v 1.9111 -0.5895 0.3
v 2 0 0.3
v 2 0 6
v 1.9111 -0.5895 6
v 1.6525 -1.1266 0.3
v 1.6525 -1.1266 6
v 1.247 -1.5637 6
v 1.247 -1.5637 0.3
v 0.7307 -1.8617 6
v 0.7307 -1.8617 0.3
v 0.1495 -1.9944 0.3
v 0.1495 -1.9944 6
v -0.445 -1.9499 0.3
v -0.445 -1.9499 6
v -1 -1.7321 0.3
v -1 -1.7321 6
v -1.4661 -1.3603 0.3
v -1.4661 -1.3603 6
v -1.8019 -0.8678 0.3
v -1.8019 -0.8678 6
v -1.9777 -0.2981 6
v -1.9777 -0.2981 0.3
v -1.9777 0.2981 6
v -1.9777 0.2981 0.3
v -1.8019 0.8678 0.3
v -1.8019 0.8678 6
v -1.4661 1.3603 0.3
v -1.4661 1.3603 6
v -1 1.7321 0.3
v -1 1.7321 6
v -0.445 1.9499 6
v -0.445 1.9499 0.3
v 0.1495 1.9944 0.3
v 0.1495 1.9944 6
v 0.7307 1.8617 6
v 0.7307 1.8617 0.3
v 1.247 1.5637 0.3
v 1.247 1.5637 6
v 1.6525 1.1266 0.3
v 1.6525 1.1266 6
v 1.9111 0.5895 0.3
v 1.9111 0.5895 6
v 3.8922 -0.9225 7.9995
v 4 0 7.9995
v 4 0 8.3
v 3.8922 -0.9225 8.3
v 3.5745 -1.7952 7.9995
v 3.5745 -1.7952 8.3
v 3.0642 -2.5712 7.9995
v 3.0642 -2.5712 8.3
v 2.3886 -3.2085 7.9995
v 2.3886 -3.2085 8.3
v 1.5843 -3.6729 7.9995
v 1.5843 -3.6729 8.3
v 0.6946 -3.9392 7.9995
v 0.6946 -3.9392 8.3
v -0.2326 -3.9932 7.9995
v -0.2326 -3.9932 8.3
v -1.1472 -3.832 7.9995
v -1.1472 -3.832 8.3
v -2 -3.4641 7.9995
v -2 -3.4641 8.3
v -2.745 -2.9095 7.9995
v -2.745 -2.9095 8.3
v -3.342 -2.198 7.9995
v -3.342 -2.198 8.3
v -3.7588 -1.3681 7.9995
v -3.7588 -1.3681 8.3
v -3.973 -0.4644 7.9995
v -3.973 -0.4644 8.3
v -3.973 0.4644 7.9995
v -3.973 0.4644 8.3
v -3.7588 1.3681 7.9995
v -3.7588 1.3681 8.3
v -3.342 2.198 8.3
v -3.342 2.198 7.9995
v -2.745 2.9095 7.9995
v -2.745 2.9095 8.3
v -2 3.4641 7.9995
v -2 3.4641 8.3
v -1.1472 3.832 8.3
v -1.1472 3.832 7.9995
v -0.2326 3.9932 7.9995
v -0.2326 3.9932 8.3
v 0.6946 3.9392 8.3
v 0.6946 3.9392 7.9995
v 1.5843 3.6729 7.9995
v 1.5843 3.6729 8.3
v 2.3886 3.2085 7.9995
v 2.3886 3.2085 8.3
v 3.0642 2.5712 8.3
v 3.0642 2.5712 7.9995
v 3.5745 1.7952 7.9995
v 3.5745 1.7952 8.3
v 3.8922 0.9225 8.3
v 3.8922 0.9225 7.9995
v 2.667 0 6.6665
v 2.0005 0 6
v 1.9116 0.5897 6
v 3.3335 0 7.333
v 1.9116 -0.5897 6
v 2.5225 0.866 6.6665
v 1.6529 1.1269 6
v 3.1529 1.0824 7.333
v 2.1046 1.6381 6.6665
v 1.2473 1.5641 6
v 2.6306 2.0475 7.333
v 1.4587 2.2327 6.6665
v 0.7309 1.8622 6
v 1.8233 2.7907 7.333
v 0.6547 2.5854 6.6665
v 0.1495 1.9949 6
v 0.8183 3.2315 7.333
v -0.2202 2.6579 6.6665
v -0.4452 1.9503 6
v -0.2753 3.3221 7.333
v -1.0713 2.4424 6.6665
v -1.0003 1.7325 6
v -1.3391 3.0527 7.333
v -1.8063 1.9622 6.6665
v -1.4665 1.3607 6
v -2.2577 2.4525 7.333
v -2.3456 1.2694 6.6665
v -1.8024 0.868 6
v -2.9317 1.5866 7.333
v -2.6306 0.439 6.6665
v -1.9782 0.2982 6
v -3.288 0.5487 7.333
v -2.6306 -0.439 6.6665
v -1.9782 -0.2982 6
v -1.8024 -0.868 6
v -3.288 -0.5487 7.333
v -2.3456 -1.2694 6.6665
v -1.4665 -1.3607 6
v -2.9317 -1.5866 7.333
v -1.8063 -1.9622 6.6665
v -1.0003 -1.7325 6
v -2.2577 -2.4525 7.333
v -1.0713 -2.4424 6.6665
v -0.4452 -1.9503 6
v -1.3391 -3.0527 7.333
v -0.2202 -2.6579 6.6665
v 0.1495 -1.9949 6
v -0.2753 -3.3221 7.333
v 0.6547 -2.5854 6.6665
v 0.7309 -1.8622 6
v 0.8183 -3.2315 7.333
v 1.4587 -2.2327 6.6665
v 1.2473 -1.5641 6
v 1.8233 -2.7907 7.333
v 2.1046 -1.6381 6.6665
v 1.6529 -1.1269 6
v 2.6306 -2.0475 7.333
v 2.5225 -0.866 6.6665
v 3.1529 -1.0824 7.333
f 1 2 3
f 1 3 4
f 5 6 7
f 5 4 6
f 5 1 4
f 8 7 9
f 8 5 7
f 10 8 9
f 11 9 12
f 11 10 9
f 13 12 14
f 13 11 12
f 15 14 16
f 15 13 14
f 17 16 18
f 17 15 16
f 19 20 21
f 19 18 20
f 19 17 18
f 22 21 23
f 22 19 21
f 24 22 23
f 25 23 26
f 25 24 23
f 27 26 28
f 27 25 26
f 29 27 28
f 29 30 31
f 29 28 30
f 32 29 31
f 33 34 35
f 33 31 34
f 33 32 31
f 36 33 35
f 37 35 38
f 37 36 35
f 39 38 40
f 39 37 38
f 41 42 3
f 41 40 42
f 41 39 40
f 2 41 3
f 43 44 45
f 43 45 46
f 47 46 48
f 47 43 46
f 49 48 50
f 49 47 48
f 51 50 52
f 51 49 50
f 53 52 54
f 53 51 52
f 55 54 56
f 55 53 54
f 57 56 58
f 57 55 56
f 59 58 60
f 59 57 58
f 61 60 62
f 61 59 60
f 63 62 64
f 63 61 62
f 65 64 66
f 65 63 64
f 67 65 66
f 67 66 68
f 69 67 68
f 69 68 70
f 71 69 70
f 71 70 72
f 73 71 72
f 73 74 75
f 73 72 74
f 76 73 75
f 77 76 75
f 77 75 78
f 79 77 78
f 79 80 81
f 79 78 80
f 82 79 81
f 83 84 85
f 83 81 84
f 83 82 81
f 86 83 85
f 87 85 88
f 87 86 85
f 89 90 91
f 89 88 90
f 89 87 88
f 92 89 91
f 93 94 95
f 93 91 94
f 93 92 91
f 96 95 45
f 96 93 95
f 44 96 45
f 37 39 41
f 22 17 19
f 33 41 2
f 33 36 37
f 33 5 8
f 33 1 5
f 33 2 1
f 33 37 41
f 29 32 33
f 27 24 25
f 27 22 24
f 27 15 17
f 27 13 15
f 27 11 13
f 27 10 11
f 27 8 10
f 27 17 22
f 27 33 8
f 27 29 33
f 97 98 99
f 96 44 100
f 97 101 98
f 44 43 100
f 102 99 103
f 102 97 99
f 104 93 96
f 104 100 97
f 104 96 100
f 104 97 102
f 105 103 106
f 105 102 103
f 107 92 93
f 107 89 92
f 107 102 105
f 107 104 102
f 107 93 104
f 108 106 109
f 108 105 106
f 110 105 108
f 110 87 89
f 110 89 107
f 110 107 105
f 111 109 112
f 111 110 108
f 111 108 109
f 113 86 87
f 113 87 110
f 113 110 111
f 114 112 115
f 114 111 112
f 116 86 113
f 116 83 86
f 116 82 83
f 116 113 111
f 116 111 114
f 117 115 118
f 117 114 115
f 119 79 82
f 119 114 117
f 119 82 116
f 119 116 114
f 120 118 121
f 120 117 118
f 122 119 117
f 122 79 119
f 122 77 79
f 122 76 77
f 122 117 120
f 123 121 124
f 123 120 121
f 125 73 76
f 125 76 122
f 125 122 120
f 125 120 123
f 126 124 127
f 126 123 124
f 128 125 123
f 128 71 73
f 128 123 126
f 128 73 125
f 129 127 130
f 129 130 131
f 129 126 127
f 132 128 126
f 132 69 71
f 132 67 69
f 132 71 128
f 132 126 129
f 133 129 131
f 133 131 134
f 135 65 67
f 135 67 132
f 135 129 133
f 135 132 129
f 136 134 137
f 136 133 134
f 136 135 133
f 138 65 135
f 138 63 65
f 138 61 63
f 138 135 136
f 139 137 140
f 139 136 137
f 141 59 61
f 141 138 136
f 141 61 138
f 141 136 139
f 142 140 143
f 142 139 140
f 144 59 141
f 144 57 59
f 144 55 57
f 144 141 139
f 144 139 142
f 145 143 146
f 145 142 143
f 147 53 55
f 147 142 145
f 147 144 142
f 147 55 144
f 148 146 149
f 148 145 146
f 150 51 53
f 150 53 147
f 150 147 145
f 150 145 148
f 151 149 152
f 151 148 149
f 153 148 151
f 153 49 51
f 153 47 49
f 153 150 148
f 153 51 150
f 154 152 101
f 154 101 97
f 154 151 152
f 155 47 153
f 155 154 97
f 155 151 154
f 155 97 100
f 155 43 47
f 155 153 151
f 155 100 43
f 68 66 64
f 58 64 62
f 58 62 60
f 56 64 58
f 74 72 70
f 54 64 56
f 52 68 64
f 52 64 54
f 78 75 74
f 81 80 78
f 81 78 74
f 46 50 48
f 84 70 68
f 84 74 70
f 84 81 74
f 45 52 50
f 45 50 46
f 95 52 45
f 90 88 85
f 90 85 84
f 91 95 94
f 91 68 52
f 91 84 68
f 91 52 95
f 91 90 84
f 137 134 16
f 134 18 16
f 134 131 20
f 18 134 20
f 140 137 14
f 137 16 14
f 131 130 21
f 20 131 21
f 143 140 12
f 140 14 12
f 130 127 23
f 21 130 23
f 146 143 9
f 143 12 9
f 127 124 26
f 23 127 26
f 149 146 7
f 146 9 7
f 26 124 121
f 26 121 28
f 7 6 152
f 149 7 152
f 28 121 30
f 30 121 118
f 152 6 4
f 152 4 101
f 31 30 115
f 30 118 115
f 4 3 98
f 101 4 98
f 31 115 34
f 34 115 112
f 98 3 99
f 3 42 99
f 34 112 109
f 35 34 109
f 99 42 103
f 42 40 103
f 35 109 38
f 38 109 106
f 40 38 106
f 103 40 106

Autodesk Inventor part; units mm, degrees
ref_plane "YZ Plane" through (0, 0, 0) normal (1, 0, 0) x (0, 1, 0)
ref_plane "XZ Plane" through (0, 0, 0) normal (0, 1, 0) x (-1, 0, 0)
ref_plane "XY Plane" through (0, 0, 0) normal (0, 0, 1) x (1, 0, 0)
sketch "スケッチ1" plane through (0, 0, 0) normal (0, 0, 1) x (1, 0, 0)
  circle A0 centre (0, 0) radius 2
  dimension "d0" = 4
extrude "押し出し1" add sketch "スケッチ1" along normal blind 6
sketch "スケッチ2" plane through (0, 0, 6) normal (0, 0, 1) x (1, 0, 0)
  circle A0 centre (0, 0) radius 2 projected
  circle A1 centre (0, 0) radius 4
  dimension "d3" = 8
extrude "押し出し2" add sketch "スケッチ2" along normal blind 2.3 contours A0 | A1
thread "ねじ1" size "M4x0.7" class "6g" standard "ANSI Metric M Profile" full length
sketch "スケッチ3" plane through (0, 0, 0) normal (0, 0, -1) x (-1, 0, 0)
  circle A0 centre (0, 0) radius 2 projected
extrude "押し出し3" cut sketch "スケッチ3" against normal blind 0.3
chamfer "面取り1" distance 2 angle 45 1 edges at (-4, 0, 6)
properties part number "SB　M4 8mm 皿ネジ" material "Stainless Steel, 440C"
